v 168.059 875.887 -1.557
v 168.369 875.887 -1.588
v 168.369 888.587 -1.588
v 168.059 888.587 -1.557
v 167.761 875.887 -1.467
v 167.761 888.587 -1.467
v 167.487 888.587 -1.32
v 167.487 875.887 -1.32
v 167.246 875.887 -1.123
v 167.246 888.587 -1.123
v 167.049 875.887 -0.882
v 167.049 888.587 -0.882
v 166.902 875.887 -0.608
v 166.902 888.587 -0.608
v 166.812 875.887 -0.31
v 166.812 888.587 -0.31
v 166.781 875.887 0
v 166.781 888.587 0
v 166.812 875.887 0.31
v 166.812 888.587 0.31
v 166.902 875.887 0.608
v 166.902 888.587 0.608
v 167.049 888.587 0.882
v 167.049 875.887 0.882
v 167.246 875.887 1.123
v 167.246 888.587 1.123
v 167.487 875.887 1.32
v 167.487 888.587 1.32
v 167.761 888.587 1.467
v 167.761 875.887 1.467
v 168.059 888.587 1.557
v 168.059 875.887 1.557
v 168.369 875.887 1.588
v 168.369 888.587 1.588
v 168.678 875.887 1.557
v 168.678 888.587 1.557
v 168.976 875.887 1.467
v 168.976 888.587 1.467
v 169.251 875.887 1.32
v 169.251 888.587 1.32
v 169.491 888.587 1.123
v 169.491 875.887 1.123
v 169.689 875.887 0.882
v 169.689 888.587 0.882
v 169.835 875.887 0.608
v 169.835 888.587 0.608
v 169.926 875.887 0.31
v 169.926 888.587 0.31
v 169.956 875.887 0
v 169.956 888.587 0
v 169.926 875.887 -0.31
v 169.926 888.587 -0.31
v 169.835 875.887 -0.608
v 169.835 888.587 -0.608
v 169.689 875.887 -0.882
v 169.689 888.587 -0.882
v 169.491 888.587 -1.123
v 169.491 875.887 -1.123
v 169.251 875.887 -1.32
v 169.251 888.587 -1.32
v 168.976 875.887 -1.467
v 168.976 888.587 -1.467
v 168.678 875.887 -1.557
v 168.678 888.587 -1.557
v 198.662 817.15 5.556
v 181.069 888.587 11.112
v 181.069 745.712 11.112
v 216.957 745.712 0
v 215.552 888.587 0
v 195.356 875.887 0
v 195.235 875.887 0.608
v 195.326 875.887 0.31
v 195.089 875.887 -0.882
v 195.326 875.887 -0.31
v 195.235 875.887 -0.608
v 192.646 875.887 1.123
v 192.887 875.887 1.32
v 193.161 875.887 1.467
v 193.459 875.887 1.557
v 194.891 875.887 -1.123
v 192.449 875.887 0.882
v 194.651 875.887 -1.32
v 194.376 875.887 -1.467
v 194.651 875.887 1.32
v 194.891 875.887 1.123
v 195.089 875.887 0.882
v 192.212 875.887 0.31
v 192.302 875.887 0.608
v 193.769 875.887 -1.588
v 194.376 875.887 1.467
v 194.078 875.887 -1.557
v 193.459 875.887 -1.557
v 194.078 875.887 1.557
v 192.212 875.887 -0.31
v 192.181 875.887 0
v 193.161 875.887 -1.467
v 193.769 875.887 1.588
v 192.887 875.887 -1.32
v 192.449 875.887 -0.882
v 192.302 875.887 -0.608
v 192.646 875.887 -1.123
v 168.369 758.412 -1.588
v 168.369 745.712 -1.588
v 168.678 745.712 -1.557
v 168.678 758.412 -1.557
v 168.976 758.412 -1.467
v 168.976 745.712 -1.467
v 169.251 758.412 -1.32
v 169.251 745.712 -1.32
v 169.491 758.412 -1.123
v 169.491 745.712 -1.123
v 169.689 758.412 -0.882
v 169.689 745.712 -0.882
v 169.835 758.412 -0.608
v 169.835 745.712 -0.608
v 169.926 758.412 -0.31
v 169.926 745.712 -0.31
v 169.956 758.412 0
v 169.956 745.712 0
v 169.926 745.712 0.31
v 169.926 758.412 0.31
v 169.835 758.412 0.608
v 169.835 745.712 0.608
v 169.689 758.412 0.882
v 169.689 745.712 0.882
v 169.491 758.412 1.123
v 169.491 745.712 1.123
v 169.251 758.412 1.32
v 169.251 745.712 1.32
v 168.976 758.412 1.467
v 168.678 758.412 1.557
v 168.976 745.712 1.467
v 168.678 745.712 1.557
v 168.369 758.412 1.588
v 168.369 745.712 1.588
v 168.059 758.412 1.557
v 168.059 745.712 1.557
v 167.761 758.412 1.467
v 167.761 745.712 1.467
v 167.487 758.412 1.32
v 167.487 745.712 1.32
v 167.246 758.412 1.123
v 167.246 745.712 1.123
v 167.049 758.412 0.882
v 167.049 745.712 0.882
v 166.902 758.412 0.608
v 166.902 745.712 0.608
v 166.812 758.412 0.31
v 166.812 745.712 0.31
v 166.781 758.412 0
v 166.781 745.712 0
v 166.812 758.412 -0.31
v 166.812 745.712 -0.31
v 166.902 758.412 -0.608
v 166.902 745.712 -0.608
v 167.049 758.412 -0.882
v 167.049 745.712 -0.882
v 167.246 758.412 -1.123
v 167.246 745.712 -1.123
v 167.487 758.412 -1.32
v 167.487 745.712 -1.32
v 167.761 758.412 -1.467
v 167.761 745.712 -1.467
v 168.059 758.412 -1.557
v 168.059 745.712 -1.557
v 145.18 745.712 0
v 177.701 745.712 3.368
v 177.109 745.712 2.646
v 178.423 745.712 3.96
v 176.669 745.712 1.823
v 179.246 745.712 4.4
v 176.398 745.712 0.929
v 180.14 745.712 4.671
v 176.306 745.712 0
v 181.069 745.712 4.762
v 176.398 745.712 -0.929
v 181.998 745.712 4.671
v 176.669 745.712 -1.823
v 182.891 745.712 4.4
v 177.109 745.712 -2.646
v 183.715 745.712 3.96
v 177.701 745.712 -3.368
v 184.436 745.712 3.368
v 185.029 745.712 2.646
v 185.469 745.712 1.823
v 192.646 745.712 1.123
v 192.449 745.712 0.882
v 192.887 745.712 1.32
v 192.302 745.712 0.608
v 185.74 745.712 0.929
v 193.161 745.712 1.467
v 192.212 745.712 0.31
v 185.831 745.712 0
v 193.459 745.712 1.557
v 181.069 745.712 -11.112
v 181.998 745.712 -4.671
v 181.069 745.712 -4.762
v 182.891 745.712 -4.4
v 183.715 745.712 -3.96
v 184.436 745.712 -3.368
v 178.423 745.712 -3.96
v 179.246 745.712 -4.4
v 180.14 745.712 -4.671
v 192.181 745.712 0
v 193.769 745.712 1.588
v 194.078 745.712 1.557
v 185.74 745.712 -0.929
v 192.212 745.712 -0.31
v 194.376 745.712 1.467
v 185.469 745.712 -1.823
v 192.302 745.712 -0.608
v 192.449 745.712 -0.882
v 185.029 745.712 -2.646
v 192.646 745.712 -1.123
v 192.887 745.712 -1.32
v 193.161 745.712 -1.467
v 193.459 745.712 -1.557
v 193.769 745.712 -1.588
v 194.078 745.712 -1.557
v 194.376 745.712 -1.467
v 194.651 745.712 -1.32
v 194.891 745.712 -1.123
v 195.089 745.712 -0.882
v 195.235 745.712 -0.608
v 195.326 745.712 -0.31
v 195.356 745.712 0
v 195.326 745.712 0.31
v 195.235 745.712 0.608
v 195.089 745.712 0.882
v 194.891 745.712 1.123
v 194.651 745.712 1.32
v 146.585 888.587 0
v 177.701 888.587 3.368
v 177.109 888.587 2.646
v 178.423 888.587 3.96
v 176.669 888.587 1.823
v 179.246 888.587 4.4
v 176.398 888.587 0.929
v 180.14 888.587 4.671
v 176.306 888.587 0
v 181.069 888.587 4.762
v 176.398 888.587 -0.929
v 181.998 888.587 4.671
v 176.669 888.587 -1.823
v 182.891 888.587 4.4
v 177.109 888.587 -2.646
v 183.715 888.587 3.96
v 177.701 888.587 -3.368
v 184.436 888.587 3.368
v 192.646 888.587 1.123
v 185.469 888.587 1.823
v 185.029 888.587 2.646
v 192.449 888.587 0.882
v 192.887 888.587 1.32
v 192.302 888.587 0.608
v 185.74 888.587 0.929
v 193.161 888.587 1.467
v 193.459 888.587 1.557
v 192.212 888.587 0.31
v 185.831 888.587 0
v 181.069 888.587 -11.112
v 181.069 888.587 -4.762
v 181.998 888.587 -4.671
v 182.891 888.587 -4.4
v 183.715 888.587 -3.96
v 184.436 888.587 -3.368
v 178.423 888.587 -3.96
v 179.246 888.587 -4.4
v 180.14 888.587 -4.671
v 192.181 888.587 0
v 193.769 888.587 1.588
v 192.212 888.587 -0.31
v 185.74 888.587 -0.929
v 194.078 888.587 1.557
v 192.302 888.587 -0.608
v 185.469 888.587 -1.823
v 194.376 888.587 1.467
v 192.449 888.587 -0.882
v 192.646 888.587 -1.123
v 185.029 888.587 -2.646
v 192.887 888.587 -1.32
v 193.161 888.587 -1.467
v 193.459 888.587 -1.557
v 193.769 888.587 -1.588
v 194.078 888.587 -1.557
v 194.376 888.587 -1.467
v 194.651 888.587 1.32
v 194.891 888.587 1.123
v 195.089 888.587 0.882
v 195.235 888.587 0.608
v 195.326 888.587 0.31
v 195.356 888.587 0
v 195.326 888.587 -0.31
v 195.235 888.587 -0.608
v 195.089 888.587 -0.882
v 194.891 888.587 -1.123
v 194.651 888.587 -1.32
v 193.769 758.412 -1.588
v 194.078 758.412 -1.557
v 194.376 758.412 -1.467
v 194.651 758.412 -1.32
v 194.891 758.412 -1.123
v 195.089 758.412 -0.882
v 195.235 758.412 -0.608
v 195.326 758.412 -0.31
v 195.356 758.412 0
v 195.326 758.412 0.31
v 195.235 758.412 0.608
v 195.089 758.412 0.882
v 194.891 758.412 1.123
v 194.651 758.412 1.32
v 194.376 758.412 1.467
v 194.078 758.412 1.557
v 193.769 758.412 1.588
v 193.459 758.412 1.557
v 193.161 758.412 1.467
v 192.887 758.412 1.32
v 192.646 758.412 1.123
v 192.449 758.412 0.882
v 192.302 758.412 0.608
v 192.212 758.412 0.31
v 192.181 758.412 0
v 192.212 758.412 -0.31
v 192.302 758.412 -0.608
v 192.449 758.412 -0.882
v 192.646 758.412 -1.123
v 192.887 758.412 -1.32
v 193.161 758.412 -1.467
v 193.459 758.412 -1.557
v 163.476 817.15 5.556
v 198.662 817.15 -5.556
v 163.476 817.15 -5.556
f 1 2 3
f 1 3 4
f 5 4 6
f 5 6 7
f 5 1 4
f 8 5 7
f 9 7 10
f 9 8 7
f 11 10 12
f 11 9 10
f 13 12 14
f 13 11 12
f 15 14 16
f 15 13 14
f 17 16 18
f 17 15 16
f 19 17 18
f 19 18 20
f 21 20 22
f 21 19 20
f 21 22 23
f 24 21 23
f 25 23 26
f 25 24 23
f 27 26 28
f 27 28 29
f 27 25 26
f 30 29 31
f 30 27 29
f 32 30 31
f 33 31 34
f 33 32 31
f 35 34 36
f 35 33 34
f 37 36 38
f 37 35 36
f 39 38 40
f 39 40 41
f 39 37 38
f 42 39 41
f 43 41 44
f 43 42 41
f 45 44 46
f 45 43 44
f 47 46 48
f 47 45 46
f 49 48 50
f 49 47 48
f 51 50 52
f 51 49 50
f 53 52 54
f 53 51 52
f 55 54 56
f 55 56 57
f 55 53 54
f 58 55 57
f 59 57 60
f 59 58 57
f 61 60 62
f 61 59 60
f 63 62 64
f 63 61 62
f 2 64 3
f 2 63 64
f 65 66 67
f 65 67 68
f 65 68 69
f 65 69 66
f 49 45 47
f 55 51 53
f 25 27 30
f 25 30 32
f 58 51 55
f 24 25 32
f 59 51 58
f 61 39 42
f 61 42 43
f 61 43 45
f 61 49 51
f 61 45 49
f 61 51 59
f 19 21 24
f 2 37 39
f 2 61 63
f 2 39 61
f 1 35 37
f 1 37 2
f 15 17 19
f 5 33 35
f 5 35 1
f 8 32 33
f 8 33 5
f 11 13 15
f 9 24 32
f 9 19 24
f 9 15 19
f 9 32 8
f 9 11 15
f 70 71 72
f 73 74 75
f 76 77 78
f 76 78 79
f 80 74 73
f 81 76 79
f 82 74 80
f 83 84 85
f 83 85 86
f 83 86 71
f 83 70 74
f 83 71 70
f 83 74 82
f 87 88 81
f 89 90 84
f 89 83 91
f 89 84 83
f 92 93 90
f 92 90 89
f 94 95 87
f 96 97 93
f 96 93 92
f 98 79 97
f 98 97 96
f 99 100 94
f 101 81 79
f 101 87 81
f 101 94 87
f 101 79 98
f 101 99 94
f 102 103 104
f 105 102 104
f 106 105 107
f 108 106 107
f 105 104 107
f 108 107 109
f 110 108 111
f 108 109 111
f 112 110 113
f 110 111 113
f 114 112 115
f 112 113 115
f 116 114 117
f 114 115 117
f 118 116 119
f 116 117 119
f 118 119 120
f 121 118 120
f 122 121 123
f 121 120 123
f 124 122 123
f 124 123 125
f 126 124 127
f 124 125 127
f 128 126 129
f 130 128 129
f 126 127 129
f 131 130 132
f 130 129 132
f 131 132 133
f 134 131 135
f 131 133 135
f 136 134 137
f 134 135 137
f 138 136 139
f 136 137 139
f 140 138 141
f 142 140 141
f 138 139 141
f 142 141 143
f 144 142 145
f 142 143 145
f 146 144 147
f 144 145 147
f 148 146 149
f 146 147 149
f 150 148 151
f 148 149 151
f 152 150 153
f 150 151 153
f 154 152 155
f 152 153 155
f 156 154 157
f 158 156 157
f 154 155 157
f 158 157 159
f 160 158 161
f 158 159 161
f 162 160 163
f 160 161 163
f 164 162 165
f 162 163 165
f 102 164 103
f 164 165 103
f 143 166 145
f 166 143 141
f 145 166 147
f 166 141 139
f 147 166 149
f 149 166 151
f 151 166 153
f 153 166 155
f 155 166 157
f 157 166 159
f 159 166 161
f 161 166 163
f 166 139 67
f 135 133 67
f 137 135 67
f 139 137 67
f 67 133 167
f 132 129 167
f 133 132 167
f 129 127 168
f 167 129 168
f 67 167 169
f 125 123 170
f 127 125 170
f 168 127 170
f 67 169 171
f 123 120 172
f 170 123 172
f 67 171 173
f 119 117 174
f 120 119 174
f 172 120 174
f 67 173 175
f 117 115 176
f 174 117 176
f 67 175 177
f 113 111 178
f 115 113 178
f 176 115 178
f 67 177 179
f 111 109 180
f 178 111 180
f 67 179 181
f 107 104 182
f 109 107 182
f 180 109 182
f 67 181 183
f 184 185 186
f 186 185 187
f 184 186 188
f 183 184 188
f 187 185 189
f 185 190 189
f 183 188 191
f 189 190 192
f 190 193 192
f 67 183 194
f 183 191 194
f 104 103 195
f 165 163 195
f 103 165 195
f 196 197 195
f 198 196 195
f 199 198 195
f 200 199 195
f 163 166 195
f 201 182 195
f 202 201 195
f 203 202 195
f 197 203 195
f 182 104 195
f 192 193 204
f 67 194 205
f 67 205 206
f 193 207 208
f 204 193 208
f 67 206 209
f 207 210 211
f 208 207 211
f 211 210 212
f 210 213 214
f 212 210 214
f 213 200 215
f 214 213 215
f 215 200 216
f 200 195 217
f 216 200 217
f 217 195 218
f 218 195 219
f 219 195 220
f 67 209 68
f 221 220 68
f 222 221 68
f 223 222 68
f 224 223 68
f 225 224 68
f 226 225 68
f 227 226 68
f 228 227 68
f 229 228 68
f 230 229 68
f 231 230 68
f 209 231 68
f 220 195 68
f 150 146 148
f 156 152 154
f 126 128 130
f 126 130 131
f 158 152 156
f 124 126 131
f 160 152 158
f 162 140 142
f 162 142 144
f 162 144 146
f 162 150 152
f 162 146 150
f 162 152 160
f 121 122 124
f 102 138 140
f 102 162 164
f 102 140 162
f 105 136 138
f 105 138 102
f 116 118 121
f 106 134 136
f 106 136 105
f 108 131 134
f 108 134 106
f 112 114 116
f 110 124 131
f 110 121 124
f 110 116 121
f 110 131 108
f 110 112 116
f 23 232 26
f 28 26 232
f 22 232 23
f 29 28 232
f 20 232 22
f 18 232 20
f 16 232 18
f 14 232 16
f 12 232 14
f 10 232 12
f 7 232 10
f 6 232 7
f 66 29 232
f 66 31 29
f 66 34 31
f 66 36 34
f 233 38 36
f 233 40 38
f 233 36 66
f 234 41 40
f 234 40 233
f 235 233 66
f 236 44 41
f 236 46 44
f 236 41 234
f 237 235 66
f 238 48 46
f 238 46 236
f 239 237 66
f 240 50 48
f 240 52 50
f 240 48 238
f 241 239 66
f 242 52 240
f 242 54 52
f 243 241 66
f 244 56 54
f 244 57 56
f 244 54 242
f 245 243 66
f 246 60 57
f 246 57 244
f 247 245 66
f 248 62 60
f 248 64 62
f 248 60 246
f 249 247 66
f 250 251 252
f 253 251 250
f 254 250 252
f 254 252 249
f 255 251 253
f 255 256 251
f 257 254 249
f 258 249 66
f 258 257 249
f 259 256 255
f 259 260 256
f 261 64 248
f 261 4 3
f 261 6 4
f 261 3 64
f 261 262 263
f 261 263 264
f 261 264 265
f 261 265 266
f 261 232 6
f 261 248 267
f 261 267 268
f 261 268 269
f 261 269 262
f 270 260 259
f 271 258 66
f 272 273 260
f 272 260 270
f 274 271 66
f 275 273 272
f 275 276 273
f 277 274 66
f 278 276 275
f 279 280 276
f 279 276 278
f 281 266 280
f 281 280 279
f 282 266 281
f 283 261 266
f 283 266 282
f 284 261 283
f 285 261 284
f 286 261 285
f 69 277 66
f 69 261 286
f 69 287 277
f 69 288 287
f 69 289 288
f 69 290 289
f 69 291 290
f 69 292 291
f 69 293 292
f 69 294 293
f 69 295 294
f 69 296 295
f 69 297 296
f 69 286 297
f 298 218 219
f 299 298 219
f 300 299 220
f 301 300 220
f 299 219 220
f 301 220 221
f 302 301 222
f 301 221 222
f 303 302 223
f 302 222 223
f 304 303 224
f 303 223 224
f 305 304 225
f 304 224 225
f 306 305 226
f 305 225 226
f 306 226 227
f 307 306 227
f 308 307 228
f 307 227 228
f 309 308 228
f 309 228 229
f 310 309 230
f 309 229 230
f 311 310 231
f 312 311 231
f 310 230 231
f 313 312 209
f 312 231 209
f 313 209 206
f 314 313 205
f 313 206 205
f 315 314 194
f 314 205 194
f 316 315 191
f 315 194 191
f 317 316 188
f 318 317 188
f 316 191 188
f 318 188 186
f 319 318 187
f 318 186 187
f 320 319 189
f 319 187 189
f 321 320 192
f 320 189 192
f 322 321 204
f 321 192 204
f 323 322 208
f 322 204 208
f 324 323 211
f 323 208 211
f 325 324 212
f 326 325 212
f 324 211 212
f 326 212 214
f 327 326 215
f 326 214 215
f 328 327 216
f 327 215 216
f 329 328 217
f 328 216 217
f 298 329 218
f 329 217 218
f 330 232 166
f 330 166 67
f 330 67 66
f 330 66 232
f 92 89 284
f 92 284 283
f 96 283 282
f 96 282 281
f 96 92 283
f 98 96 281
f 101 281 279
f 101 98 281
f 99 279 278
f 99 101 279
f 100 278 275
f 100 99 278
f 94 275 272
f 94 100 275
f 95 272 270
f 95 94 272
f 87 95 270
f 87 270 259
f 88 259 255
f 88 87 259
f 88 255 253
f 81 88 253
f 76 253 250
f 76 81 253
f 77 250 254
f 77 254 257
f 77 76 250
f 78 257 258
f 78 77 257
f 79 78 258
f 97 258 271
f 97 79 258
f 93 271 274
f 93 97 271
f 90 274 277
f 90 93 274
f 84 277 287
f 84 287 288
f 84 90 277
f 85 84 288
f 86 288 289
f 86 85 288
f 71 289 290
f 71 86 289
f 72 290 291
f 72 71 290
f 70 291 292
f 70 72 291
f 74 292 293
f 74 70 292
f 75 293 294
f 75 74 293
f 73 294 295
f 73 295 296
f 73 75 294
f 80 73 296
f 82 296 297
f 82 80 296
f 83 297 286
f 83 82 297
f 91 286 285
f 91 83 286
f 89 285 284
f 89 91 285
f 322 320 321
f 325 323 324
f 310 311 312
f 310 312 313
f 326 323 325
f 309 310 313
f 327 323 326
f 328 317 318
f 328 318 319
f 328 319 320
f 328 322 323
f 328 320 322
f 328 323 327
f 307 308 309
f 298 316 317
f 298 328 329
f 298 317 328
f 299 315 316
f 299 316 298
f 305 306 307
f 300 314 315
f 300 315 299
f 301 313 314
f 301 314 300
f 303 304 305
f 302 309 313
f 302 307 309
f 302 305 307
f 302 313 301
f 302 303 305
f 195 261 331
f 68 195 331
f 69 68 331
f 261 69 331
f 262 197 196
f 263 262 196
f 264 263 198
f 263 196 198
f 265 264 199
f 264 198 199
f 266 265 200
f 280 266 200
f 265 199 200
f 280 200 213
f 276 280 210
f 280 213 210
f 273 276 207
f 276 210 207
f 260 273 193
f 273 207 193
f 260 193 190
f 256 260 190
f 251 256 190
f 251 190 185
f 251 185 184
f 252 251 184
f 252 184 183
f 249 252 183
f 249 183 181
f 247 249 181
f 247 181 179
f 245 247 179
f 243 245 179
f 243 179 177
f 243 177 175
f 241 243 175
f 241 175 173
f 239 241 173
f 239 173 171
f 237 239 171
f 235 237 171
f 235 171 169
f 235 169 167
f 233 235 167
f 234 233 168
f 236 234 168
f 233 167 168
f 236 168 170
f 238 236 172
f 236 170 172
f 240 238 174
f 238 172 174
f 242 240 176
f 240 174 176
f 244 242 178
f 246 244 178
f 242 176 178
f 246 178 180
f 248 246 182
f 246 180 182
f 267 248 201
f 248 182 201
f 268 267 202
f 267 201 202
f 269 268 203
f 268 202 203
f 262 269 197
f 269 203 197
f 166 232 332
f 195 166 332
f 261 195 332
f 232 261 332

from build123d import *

# Parameters (mm, degrees)
BOSS_EXTRUDE1_DEPTH      = 11.1125
BOSS_EXTRUDE1_DEPTH_BACK = 11.1125
SKETCH5_W                = 109.877468776
SKETCH5_H                = 283.051122129
CUT_EXTRUDE2_DEPTH       = 1193.492852366
SKETCH6_W                = 149.121482991
SKETCH6_H                = 108.921761737
CUT_EXTRUDE3_DEPTH       = 1175.662940665
SKETCH7_R                = 4.7625
CUT_EXTRUDE4_DEPTH       = 635
CUT_EXTRUDE8_DEPTH       = 1195.766301895
CUT_EXTRUDE8_DEPTH_BACK  = 1195.766301895
SKETCH8_W                = 149.774750394
SKETCH8_H                = 148.832770831
SKETCH8_H_2              = 142.875
SKETCH8_H_3              = 176.125878949
SKETCH13_R               = 1.5875
CUT_EXTRUDE11_DEPTH      = 12.7
CUT_EXTRUDE12_START      = -12.7
SKETCH14_R               = 1.5875
CUT_EXTRUDE12_DEPTH      = 12.7


with BuildPart() as part:
    # Sketch1 → Boss-Extrude1 (new, two sides: drawn at the far end of the back side and taken through both)
    with BuildSketch(Plane.XY.offset(-BOSS_EXTRUDE1_DEPTH_BACK)):
        Polygon((142.42123069, 465.168027231), (219.716026672, 465.168027231), (213.502471629, 1096.967634552), (181.068628681, 1174.337215652), (148.634785732, 1096.967634552), align=None)
    extrude(amount=BOSS_EXTRUDE1_DEPTH + BOSS_EXTRUDE1_DEPTH_BACK)

    # Sketch2 → Cut-Loft1 section 0
    with BuildSketch(Plane.XZ.offset(-465.168027231)):
        with BuildLine():
            Line((142.42123069, 0), (181.068628681, 11.1125))
            Line((181.068628681, 11.1125), (219.716026672, 0))
            Line((219.716026672, 0), (222.70513775, 0))
            Line((222.70513775, 0), (222.70513775, 15.258366339))
            Line((222.70513775, 15.258366339), (137.848628215, 15.258366339))
            Line((137.848628215, 15.258366339), (137.848628215, 0))
            Line((137.848628215, 0), (142.42123069, 0))
        make_face()
    # Sketch3 → Cut-Loft1 section 1
    with BuildSketch(Plane(origin=(0, 1096.967634552, 0), x_dir=(1, 0, 0), z_dir=(0, 1, 0))):
        with BuildLine():
            Line((213.502471629, 0), (181.068628681, -11.1125))
            Line((181.068628681, -11.1125), (148.634785732, 0))
            Line((148.634785732, 0), (137.848628215, 0))
            Line((137.848628215, 0), (137.848628215, -15.258366339))
            Line((137.848628215, -15.258366339), (222.70513775, -15.258366339))
            Line((222.70513775, -15.258366339), (222.70513775, 0))
            Line((222.70513775, 0), (213.502471629, 0))
        make_face()
    cut_loft1 = loft(mode=Mode.SUBTRACT)

    # Mirror1: Cut-Loft1 across plane
    add(cut_loft1.mirror(Plane.XY), mode=Mode.SUBTRACT)

    # Sketch5 → Cut-Extrude2 (cut, through all)
    with BuildSketch(Plane(origin=(-32.103098407, 13.457832356, 93.698704331), x_dir=(0.9470206004067627, 0.045661094409327196, 0.31791043842968925), z_dir=(-0.3211728232668741, 0.1346377834927197, 0.937401026696127))):
        with Locations((219.349244299, 1139.303724701)):
            Rectangle(SKETCH5_W, SKETCH5_H)
    cut_extrude2 = extrude(amount=CUT_EXTRUDE2_DEPTH, mode=Mode.SUBTRACT)

    # Sketch6 → Cut-Extrude3 (cut, through all)
    with BuildSketch(Plane(origin=(69.458274406, 29.117370568, 202.726547902), x_dir=(0.9470206004067623, -0.045661094409327495, -0.31791043842969063), z_dir=(0.3211728232668754, 0.13463778349272, 0.9374010266961263))):
        with Locations((131.752816965, 1118.922251835)):
            Rectangle(SKETCH6_W, SKETCH6_H)
    cut_extrude3 = extrude(amount=CUT_EXTRUDE3_DEPTH, mode=Mode.SUBTRACT)

    # Mirror2: Cut-Extrude2, Cut-Extrude3 across plane
    add(cut_extrude2.mirror(Plane.XY), mode=Mode.SUBTRACT)
    add(cut_extrude3.mirror(Plane.XY), mode=Mode.SUBTRACT)

    # Sketch7 → Cut-Extrude4 (cut)
    with BuildSketch(Plane.XZ.offset(-465.168027231)):
        with Locations(Location((181.068628681, 0, 0), (0, 0, 270))):
            Circle(SKETCH7_R)
    extrude(amount=-CUT_EXTRUDE4_DEPTH, mode=Mode.SUBTRACT)

    # Sketch8 → Cut-Extrude8 (cut, two sides: drawn at the far end of the back side and taken through both)
    with BuildSketch(Plane.XY.offset(-CUT_EXTRUDE8_DEPTH_BACK)):
        with Locations((180.5976389, 528.420830237)):
            Rectangle(SKETCH8_W, SKETCH8_H)
        with Locations((180.5976389, 960.024715652)):
            Rectangle(SKETCH8_W, SKETCH8_H_2)
        with Locations((180.5976389, 1119.525155127)):
            Rectangle(SKETCH8_W, SKETCH8_H_3)
        with Locations((180.5976389, 674.274715652)):
            Rectangle(SKETCH8_W, SKETCH8_H_2)
    extrude(amount=CUT_EXTRUDE8_DEPTH + CUT_EXTRUDE8_DEPTH_BACK, mode=Mode.SUBTRACT)

    # Sketch13 → Cut-Extrude11 (cut)
    with BuildSketch(Plane.XZ.offset(-745.712215652)):
        with Locations(Location((168.368628681, 0, 0), (0, 0, 270))):
            Circle(SKETCH13_R)
        with Locations(Location((193.768628681, 0, 0), (0, 0, 270))):
            Circle(SKETCH13_R)
    extrude(amount=-CUT_EXTRUDE11_DEPTH, mode=Mode.SUBTRACT)

    # Sketch14 → Cut-Extrude12 (cut)
    with BuildSketch(Plane(origin=(0, 888.587215652, 0), x_dir=(1, 0, 0), z_dir=(0, 1, 0)).offset(CUT_EXTRUDE12_START)):
        with Locations(Location((168.368628681, 0, 0), (0, 0, 90))):
            Circle(SKETCH14_R)
        with Locations(Location((193.768628681, 0, 0), (0, 0, 90))):
            Circle(SKETCH14_R)
    extrude(amount=CUT_EXTRUDE12_DEPTH, mode=Mode.SUBTRACT)


solid = part.part
